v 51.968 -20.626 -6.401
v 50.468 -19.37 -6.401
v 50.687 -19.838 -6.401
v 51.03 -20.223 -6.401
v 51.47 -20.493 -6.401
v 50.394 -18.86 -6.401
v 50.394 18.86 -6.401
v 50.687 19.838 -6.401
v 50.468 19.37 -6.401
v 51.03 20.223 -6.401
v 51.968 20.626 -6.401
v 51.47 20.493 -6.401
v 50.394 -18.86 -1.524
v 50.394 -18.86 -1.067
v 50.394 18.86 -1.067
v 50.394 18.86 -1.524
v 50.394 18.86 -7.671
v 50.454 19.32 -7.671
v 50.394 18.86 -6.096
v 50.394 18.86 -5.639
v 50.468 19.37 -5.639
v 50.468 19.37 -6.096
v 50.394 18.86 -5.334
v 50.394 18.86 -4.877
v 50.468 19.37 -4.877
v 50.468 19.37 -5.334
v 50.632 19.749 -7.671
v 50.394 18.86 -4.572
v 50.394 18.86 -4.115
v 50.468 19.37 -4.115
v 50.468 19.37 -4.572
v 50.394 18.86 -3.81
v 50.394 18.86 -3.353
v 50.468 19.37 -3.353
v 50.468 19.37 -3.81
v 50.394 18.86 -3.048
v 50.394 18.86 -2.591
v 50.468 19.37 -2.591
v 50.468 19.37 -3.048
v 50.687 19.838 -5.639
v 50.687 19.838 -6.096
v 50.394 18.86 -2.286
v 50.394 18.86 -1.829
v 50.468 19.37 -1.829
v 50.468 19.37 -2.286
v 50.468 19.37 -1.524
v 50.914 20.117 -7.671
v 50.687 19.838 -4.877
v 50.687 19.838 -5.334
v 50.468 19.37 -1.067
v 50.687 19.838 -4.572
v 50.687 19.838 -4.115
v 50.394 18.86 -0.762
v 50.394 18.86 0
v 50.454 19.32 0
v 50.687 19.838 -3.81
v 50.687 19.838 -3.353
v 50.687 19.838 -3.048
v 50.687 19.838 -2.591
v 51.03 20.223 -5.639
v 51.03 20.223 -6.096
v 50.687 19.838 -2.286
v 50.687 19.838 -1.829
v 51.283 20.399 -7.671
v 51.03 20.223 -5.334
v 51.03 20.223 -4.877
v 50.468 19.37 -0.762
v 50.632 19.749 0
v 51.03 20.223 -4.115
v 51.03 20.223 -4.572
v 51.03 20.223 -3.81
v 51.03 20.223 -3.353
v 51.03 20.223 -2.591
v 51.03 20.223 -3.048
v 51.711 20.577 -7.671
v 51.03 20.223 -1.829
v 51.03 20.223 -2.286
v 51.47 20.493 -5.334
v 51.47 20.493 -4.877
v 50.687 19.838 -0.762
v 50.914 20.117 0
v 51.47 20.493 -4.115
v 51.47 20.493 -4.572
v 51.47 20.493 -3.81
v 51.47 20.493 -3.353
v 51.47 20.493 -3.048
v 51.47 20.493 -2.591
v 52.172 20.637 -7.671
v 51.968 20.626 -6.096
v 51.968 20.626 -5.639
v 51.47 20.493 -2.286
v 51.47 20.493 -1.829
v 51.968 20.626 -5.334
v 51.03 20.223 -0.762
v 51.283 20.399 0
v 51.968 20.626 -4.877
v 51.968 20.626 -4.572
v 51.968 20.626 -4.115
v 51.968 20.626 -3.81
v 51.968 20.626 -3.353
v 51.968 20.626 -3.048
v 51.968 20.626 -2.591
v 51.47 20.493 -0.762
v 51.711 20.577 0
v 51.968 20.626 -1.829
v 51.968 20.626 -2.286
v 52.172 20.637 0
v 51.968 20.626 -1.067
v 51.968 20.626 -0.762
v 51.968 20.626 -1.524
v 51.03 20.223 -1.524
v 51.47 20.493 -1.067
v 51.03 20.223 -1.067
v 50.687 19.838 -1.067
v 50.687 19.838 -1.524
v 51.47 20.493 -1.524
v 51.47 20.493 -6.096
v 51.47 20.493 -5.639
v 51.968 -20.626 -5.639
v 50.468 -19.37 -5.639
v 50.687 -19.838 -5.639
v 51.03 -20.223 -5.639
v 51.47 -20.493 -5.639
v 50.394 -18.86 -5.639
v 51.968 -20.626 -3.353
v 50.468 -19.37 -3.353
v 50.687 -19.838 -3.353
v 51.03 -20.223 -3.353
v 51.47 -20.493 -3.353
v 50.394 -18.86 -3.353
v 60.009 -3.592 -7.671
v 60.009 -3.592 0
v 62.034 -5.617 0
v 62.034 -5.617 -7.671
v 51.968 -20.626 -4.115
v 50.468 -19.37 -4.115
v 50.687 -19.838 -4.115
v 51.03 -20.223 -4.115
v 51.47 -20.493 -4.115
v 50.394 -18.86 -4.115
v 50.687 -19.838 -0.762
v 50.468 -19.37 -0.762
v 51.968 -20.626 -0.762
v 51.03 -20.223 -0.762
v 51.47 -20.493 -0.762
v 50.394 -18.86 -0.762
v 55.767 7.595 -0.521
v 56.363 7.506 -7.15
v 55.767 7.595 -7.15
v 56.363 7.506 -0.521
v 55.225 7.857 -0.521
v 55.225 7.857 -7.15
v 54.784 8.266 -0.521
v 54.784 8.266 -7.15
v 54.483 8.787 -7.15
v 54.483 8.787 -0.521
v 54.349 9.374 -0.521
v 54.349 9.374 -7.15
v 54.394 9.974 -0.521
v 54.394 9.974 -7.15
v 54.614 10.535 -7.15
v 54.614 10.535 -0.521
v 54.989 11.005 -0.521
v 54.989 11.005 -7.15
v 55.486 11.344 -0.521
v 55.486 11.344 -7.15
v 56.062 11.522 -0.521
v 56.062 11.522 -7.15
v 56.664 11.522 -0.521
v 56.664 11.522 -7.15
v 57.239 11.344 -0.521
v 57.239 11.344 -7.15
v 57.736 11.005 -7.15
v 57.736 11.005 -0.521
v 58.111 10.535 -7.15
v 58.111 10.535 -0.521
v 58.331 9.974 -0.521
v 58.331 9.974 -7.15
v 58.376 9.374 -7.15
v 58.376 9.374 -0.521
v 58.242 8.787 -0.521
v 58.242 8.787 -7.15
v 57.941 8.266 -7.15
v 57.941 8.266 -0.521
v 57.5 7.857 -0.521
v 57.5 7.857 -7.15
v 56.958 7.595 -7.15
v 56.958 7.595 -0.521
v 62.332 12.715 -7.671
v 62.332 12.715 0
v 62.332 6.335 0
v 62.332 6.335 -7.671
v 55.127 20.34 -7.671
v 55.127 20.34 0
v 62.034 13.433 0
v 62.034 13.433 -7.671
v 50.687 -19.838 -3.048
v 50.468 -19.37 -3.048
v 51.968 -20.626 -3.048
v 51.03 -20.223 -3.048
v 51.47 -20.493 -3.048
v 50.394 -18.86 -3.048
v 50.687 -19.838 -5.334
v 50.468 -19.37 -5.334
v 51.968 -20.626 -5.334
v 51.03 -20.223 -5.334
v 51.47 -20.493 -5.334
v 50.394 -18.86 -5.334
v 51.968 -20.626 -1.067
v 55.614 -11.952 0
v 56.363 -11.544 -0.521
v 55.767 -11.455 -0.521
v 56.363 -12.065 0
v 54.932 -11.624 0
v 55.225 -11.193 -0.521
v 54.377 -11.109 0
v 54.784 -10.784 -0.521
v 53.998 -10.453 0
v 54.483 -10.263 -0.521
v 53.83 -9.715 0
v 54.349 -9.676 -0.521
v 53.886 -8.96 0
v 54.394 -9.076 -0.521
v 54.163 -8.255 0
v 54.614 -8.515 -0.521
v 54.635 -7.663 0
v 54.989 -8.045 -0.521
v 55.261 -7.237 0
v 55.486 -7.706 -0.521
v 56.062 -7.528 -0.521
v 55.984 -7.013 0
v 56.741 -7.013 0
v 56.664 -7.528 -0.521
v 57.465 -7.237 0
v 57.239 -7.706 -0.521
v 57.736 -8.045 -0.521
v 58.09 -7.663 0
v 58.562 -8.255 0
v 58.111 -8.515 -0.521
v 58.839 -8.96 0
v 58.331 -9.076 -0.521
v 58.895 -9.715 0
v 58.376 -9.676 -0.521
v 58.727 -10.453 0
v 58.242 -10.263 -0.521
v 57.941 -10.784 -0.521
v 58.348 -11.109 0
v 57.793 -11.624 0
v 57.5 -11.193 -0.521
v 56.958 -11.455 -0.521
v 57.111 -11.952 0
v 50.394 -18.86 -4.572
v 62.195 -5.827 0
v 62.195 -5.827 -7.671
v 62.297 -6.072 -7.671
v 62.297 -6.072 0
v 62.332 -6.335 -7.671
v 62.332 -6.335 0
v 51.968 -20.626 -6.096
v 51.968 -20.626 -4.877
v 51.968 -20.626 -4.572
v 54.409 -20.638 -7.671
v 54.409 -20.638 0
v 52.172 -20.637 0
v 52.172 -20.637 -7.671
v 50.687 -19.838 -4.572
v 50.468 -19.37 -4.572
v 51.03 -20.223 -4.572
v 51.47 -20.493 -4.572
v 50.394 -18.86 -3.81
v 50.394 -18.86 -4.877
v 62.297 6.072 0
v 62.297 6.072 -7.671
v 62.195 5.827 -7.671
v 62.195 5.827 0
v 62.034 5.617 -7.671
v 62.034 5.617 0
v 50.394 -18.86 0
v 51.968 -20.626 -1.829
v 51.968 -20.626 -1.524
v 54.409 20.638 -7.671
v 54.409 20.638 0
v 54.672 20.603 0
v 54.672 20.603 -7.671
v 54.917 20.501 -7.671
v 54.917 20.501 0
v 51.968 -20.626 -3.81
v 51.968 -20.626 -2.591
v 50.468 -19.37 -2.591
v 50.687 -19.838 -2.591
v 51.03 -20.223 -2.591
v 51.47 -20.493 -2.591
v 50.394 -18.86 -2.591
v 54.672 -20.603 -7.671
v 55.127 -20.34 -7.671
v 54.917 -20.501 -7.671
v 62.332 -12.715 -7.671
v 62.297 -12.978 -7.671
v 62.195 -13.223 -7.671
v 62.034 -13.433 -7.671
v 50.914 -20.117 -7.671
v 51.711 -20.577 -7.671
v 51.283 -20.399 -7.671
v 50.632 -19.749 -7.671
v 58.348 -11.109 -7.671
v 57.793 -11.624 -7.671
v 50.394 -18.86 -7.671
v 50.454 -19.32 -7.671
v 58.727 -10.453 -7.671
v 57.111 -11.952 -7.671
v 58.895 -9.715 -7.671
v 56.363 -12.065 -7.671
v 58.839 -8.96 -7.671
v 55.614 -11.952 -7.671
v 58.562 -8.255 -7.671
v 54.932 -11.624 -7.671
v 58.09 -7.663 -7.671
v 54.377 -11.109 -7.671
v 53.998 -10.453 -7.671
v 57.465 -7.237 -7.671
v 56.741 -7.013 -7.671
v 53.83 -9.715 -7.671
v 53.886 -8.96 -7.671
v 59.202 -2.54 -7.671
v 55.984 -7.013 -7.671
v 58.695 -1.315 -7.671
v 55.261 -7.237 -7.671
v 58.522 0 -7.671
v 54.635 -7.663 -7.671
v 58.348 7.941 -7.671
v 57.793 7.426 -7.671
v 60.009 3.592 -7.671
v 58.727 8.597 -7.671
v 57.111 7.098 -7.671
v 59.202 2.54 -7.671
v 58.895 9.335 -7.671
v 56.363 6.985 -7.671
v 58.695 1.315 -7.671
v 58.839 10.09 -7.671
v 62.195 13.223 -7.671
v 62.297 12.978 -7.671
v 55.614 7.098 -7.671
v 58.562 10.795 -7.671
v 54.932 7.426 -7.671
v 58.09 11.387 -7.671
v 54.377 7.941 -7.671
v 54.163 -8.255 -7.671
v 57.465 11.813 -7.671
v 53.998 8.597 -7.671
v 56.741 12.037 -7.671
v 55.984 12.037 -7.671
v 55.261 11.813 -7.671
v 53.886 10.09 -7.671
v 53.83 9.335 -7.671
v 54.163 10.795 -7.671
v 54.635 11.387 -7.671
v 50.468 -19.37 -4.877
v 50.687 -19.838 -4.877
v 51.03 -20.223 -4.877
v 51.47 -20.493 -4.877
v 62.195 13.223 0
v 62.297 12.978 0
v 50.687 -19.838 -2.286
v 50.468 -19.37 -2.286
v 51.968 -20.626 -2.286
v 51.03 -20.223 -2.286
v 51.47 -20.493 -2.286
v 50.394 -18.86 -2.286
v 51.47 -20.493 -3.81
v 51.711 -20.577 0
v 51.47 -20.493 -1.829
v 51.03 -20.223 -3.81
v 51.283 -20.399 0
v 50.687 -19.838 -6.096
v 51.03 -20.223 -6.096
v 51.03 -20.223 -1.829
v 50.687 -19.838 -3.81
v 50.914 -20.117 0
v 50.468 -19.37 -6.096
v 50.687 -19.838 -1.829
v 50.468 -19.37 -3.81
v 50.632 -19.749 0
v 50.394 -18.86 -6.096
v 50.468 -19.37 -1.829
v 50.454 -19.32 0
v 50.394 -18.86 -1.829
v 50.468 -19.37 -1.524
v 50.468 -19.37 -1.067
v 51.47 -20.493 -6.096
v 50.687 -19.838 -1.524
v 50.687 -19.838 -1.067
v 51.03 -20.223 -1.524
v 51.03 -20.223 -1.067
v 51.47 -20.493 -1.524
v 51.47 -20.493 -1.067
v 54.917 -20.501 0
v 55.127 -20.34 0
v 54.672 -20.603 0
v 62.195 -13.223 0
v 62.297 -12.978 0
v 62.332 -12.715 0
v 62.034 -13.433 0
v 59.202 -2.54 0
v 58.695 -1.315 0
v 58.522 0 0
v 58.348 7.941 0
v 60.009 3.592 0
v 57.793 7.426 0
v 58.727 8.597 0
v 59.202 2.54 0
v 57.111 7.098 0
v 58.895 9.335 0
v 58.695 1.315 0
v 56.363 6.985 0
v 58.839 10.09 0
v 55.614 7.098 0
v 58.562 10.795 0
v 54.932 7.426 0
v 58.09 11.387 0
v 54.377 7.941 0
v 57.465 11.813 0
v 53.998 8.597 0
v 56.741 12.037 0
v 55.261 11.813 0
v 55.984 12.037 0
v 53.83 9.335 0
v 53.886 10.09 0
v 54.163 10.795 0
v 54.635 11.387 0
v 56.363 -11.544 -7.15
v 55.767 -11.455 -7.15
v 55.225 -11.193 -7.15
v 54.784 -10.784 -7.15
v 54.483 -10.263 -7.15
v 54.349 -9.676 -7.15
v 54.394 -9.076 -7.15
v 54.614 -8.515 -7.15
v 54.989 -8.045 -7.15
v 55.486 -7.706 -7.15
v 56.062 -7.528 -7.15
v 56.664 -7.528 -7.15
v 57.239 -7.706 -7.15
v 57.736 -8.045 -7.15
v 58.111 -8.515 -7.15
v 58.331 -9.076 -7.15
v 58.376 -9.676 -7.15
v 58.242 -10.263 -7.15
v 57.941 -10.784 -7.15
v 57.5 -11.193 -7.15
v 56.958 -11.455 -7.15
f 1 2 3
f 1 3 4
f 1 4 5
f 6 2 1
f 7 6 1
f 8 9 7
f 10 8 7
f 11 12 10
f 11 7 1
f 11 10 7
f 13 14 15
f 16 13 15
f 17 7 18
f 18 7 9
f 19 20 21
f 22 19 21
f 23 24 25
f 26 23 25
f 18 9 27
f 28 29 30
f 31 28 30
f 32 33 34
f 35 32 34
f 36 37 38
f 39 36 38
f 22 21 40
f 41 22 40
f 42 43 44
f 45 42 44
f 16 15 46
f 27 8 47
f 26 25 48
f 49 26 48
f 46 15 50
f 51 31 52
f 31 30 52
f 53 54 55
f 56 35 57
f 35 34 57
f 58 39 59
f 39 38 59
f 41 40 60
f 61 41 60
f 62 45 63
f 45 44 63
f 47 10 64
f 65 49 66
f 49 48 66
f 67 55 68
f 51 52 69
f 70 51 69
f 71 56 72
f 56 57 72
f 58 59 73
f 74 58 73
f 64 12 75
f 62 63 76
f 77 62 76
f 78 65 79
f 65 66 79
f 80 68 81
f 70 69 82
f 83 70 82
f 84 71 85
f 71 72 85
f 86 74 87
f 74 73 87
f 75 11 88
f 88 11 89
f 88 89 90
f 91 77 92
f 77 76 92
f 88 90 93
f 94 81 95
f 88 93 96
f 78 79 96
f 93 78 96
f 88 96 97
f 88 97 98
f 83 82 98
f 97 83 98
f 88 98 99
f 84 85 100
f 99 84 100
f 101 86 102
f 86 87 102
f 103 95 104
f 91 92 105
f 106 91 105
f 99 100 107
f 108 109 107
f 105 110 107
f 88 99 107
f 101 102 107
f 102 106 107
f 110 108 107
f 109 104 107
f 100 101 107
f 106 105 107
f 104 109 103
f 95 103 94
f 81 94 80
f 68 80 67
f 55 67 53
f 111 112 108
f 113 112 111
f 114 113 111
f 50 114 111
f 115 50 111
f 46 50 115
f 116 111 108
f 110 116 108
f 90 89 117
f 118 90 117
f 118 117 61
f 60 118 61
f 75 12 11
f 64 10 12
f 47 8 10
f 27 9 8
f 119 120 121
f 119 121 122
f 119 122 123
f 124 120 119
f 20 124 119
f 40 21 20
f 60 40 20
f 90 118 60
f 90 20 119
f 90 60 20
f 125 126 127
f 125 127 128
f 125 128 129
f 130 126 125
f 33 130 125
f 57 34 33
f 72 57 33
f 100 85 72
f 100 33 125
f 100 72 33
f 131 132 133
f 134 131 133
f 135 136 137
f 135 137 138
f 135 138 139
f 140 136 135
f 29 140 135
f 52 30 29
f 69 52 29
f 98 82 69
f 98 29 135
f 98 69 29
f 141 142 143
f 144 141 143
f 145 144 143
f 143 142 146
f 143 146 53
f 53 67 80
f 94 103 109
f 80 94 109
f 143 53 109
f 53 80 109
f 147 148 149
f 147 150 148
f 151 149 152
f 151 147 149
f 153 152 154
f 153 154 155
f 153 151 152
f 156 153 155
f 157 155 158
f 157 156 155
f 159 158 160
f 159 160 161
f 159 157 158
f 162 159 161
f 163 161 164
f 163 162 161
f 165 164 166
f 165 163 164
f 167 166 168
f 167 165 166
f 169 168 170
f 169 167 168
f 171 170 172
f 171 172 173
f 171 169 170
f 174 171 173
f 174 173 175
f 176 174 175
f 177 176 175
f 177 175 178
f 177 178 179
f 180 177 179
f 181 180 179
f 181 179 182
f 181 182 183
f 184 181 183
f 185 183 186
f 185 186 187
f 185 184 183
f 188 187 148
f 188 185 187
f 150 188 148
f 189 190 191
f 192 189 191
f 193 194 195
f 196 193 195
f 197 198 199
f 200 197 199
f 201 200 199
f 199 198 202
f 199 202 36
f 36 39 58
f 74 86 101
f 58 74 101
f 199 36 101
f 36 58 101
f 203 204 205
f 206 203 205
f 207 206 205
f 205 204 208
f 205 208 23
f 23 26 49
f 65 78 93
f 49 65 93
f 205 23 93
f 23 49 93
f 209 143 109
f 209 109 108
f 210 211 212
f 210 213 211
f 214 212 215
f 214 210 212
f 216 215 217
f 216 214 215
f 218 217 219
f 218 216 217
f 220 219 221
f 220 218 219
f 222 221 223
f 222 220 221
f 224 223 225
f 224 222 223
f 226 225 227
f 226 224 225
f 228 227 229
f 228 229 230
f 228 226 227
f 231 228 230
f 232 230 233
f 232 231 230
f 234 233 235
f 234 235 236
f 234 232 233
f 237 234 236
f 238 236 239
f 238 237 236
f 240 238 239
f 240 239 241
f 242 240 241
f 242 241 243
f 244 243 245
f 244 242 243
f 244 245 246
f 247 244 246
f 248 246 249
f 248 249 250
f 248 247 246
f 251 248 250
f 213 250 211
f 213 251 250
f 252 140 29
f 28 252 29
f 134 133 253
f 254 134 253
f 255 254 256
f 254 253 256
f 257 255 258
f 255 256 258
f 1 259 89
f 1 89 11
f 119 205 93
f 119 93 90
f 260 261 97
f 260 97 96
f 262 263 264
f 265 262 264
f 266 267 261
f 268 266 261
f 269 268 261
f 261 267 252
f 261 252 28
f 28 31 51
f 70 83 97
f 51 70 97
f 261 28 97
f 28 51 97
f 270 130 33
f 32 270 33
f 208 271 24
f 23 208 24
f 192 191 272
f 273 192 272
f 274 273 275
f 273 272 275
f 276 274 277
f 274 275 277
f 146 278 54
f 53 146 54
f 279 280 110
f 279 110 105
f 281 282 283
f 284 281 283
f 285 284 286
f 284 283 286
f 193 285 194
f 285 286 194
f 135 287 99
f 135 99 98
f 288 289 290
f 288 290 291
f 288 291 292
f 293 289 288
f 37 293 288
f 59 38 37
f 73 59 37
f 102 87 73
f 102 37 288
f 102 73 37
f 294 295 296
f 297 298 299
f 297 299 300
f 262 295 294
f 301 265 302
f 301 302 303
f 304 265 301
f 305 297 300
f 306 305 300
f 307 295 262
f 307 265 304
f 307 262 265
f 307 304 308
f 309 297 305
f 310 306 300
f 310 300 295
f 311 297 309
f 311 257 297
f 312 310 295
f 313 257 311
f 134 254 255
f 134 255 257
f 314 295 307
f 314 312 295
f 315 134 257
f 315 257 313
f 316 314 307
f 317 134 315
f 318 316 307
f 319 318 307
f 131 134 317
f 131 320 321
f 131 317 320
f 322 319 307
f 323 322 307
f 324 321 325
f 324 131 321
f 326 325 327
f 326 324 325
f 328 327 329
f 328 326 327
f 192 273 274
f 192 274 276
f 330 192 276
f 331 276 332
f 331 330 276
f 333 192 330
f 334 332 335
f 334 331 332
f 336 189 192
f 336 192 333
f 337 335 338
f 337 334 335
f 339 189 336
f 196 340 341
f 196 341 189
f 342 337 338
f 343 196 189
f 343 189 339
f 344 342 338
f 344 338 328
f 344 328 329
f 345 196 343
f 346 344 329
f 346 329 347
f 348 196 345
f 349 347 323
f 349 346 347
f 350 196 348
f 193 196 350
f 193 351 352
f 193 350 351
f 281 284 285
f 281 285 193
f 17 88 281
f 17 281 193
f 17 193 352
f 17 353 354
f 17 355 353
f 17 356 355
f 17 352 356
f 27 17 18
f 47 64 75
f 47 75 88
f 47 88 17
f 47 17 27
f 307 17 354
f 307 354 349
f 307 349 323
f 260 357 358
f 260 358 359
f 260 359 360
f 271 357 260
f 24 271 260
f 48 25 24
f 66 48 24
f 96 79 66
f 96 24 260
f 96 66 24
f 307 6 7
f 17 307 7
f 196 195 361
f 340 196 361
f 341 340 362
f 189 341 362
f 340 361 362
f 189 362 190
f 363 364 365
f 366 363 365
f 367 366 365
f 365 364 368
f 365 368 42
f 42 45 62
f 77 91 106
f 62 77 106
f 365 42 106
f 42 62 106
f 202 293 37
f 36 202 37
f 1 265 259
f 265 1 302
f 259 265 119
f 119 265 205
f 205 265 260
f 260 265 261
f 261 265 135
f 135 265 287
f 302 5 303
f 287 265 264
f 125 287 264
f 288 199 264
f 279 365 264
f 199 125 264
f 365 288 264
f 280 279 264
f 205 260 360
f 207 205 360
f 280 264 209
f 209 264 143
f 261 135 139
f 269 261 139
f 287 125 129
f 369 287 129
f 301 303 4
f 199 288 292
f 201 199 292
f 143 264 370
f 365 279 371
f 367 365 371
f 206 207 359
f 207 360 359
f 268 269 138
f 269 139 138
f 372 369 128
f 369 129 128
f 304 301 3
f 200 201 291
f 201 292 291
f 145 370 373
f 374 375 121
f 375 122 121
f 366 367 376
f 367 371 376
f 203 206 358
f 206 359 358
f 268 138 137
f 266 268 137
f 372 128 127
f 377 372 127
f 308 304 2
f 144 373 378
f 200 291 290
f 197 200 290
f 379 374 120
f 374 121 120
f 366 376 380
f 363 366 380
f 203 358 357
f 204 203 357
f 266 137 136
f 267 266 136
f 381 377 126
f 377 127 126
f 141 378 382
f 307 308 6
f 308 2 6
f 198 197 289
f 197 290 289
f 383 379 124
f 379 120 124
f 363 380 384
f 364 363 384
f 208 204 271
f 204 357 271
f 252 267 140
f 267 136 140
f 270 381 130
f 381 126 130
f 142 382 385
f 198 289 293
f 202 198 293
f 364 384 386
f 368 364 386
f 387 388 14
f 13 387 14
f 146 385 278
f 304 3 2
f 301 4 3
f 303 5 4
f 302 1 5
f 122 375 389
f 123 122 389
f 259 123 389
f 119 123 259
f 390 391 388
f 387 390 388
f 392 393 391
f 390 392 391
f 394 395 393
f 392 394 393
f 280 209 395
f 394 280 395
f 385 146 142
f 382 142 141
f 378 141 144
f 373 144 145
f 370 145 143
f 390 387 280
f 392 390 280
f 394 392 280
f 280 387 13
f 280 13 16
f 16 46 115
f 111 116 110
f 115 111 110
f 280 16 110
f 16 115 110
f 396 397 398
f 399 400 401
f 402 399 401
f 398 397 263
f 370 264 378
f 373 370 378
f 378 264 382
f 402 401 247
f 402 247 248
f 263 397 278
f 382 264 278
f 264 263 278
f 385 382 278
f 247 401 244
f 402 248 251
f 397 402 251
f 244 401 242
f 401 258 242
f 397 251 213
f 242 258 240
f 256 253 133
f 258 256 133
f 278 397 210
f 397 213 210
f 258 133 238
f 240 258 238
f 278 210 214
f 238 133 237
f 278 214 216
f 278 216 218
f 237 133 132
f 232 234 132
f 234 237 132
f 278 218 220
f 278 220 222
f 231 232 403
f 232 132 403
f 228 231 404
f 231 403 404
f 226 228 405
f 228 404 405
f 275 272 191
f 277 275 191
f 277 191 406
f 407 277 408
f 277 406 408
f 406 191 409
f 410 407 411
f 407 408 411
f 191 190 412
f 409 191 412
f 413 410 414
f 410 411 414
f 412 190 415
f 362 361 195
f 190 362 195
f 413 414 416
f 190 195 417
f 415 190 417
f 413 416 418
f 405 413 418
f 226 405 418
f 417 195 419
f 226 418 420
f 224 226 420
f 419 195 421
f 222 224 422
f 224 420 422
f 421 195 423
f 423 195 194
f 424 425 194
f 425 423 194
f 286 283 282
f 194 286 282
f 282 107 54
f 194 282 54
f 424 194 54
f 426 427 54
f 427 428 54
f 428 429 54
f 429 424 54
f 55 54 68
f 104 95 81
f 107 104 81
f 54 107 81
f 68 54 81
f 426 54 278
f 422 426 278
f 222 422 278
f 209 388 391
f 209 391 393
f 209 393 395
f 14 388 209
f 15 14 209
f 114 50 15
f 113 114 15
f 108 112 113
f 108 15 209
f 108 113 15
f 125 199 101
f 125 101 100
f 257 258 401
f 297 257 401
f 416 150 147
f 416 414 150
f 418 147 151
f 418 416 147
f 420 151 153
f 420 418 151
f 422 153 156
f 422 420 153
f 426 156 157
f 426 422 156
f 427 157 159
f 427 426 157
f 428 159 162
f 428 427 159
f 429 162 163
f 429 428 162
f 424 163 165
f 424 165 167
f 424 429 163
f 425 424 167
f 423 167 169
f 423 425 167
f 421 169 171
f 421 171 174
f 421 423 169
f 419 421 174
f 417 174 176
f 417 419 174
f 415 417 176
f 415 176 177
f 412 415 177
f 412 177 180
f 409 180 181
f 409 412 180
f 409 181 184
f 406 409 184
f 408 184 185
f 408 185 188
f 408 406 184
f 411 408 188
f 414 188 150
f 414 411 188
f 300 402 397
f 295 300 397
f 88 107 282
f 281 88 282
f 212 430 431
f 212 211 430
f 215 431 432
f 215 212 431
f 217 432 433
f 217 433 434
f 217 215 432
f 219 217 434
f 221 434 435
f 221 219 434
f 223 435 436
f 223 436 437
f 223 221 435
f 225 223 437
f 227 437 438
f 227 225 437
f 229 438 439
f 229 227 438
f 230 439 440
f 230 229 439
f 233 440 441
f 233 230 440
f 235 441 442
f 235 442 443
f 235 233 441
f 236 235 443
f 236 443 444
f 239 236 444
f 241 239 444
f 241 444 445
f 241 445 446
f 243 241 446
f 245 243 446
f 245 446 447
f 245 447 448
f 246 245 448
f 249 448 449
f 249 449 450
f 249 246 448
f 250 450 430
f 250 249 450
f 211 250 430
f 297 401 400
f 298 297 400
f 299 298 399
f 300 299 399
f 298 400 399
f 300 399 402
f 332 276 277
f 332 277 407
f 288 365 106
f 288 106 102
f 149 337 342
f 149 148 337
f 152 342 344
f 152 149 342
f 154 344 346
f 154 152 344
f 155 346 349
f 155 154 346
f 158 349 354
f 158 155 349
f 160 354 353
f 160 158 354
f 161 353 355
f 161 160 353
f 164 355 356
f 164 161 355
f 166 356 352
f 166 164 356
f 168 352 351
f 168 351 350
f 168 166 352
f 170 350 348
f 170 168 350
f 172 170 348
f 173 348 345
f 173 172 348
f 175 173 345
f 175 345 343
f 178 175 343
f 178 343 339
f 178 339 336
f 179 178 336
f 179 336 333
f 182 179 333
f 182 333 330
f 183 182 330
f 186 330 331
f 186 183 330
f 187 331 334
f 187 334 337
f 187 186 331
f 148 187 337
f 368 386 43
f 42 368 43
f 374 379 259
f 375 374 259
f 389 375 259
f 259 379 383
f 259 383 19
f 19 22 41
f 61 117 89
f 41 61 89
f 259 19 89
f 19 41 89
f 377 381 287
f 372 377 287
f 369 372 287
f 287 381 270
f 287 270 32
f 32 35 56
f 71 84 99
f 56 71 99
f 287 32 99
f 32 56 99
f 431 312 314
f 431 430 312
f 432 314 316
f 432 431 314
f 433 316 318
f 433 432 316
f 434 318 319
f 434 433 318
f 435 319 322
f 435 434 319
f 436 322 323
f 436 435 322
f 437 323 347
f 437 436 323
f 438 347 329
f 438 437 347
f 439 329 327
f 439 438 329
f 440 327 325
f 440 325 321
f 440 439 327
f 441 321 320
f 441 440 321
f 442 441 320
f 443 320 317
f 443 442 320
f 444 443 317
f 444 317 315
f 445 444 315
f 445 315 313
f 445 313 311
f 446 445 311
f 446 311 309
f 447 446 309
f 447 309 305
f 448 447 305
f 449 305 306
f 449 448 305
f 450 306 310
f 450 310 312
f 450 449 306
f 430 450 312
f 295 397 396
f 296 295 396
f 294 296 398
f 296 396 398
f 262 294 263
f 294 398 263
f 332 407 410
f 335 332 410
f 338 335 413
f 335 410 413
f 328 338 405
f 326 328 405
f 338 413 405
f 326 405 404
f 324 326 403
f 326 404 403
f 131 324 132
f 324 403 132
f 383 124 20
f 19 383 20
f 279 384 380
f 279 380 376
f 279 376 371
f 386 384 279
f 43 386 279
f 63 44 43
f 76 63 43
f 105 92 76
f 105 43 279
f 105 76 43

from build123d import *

# Parameters (mm, degrees)
BOSS_EXTRUDE1_DEPTH             = 7.6708
SKETCH2_W                       = 5.08
SKETCH2_H                       = 0.3048
CUT_EXTRUDE1_DEPTH              = 38.1
LPATTERN1_COUNT                 = 8
LPATTERN1_PITCH                 = 0.762
F_10_32_TAPPED_HOLE1_AT_2_COUNT = 2
F_10_32_TAPPED_HOLE1_AT_2_PITCH = 19.05


with BuildPart() as part:
    # Sketch1 → Boss-Extrude1 (new body)
    with BuildSketch(Plane.XY):
        with BuildLine():
            Line((52.1716, 20.6375), (54.409054124, 20.6375))
            ThreePointArc((54.409054124, 20.6375), (54.797860491, 20.560161605), (55.127474613, 20.33992049))
            Line((55.127474613, 20.33992049), (62.03402049, 13.433374613))
            ThreePointArc((62.03402049, 13.433374613), (62.254261605, 13.103760491), (62.3316, 12.714954124))
            Line((62.3316, 12.714954124), (62.3316, 6.335045876))
            ThreePointArc((62.3316, 6.335045876), (62.254261605, 5.946239509), (62.03402049, 5.616625387))
            Line((62.03402049, 5.616625387), (60.009497552, 3.592102448))
            ThreePointArc((60.009497552, 3.592102448), (58.5216, 0), (60.009497552, -3.592102448))
            Line((60.009497552, -3.592102448), (62.03402049, -5.616625387))
            ThreePointArc((62.03402049, -5.616625387), (62.254261605, -5.946239509), (62.3316, -6.335045876))
            Line((62.3316, -6.335045876), (62.3316, -12.714954124))
            ThreePointArc((62.3316, -12.714954124), (62.254261605, -13.103760491), (62.03402049, -13.433374613))
            Line((62.03402049, -13.433374613), (55.127474613, -20.33992049))
            ThreePointArc((55.127474613, -20.33992049), (54.797860491, -20.560161605), (54.409054124, -20.6375))
            Line((54.409054124, -20.6375), (52.1716, -20.6375))
            ThreePointArc((52.1716, -20.6375), (50.914364143, -20.116735857), (50.3936, -18.8595))
            Line((50.3936, -18.8595), (50.3936, 18.8595))
            ThreePointArc((50.3936, 18.8595), (50.914364143, 20.116735857), (52.1716, 20.6375))
        make_face()
    extrude(amount=-BOSS_EXTRUDE1_DEPTH)

    # Sketch2 → Cut-Extrude1 (cut, symmetric)
    with BuildSketch(Plane(origin=(0, 0, 0), x_dir=(1, 0, 0), z_dir=(0, 1, 0))):
        with Locations((49.4284, 0.9144)):
            Rectangle(SKETCH2_W, SKETCH2_H)
    cut_extrude1 = extrude(amount=CUT_EXTRUDE1_DEPTH, both=True, mode=Mode.SUBTRACT)

    # LPattern1: Cut-Extrude1 ×8
    with Locations(*[(0, 0, -i * LPATTERN1_PITCH) for i in range(1, LPATTERN1_COUNT)]):
        add(cut_extrude1, mode=Mode.SUBTRACT)

    # Sketch3 → #10-32 Tapped Hole1 (revolve, cut)
    with BuildSketch(Plane(origin=(56.3626, 9.525, 0), x_dir=(0, -1, 0), z_dir=(1, 0, 0))):
        Polygon((0, 0), (0, 7.6708), (2.54, 7.6708), (2.0193, 7.1501), (2.0193, 0.5207), (2.54, 0), align=None)
    f_10_32_tapped_hole1 = revolve(axis=Axis((56.3626, 9.525, 6.35), (0, 0, -1)), mode=Mode.SUBTRACT)

    # #10-32 Tapped Hole1 at 2: #10-32 Tapped Hole1 ×2
    with Locations(*[(0, -i * F_10_32_TAPPED_HOLE1_AT_2_PITCH, 0) for i in range(1, F_10_32_TAPPED_HOLE1_AT_2_COUNT)]):
        add(f_10_32_tapped_hole1, mode=Mode.SUBTRACT)


solid = part.part
